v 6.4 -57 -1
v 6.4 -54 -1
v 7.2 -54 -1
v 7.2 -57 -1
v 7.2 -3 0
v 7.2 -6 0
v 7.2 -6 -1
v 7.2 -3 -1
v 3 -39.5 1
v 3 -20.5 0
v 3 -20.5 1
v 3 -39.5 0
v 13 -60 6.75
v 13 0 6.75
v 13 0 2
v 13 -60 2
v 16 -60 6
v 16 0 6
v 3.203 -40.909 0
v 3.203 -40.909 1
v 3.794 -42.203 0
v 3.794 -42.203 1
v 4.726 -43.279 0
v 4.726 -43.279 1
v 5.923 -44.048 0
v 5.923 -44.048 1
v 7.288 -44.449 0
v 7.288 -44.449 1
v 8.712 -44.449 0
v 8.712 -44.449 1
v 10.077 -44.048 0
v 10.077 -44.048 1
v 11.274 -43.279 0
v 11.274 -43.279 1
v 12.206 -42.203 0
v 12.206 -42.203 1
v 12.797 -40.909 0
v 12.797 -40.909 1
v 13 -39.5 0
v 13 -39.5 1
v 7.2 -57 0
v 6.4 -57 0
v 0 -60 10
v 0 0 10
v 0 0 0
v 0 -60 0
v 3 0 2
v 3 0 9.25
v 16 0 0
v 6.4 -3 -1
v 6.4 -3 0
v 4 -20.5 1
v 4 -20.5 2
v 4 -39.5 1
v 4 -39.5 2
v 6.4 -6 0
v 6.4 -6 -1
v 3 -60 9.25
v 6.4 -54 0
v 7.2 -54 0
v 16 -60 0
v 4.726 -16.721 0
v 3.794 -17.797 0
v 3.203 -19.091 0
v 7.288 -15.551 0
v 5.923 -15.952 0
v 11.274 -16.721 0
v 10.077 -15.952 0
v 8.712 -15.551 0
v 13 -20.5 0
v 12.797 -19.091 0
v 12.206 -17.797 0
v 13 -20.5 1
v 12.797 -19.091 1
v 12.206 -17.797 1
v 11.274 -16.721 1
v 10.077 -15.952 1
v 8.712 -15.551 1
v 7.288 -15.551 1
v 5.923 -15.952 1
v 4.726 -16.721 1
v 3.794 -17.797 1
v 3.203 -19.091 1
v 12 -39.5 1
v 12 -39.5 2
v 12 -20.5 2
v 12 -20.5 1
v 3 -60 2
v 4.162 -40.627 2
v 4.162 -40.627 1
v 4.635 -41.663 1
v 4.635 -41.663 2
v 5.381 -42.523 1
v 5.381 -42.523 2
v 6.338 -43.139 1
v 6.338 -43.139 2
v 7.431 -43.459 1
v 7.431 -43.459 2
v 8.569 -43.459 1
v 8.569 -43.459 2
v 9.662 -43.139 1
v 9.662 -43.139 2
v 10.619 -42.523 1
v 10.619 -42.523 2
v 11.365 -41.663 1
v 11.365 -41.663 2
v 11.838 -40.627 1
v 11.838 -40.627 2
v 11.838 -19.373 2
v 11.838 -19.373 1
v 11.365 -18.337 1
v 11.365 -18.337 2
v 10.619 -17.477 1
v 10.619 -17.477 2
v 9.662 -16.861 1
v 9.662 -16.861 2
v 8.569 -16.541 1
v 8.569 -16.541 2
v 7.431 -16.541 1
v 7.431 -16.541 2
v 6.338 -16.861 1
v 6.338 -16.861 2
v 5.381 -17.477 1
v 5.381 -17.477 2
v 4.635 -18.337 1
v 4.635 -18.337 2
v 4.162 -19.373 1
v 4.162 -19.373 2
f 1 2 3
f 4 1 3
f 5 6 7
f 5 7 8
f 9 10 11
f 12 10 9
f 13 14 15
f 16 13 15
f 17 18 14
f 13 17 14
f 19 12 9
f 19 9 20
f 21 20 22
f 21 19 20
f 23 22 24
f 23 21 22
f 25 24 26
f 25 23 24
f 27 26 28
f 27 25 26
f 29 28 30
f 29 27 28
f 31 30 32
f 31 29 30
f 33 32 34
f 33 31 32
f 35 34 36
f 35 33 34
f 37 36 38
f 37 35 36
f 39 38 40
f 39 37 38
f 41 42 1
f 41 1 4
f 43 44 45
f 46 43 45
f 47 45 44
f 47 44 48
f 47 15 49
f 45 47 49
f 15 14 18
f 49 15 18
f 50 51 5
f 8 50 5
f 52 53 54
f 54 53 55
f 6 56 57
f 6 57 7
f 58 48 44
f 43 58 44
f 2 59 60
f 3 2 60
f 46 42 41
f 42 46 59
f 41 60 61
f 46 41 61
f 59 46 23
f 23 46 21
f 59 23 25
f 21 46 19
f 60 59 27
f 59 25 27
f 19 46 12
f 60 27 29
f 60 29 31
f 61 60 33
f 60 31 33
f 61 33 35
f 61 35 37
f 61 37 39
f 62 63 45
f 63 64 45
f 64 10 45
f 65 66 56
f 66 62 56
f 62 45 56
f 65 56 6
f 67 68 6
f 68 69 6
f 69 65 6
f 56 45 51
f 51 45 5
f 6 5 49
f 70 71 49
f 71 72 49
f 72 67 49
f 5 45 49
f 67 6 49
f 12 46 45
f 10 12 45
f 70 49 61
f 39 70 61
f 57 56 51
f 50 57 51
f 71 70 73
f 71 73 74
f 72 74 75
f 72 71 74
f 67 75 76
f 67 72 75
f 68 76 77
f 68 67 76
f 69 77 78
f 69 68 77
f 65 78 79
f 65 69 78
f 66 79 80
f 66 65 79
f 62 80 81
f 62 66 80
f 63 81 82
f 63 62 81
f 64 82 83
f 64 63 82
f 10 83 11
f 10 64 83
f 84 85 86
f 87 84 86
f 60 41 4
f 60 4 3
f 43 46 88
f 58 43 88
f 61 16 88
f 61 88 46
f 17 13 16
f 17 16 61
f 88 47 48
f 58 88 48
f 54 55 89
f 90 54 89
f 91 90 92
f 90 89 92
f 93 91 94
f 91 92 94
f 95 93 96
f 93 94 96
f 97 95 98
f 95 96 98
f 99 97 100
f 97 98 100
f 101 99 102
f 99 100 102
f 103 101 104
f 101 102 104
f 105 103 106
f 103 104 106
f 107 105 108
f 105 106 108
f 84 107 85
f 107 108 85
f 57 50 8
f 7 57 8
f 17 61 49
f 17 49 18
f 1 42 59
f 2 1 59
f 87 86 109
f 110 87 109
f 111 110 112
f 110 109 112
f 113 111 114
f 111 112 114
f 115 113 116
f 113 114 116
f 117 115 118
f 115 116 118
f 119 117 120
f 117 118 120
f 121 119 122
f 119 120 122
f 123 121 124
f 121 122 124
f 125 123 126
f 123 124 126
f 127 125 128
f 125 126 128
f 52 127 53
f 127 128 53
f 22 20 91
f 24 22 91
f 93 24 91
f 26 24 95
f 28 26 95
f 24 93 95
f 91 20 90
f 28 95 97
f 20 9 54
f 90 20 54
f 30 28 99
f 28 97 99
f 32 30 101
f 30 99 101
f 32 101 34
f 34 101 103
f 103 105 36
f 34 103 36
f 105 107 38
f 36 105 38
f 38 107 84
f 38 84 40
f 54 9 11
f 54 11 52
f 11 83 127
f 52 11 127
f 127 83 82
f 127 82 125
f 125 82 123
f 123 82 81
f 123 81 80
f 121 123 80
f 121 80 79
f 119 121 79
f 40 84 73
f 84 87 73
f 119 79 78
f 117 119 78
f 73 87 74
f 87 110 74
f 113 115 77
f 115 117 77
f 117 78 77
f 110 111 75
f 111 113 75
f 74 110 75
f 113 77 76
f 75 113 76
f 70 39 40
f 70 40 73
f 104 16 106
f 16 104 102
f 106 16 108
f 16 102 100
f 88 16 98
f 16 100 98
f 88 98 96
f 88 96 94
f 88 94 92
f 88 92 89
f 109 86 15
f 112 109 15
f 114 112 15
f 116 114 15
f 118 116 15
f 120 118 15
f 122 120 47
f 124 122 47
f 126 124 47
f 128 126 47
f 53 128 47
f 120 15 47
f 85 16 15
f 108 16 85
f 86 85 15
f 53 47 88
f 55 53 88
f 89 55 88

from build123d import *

# Parameters (mm, degrees)
F1_DEPTH = 60
F3_DEPTH = 2.001
F5_DEPTH = 1
F6_W     = 0.8
F6_H     = 3
F7_DEPTH = 1


# Not quite as in the source:
# - a feature names something its author has since deleted; it is built from what else it names


with BuildPart() as f1:
    # F0 (on Front) → F1 (new body)
    with BuildSketch(Plane.XZ):
        Polygon((0, 10), (0, 0), (16, 0), (16, 6), (13, 6.75), (13, 2), (3, 2), (3, 9.25), align=None)
    extrude(amount=F1_DEPTH)

    # F2 (on face) → F3 (cut, through all)
    with BuildSketch(Plane.XY.offset(2)):
        with BuildLine():
            ThreePointArc((12, -20.5), (8, -16.5), (4, -20.5))
            Line((4, -20.5), (4, -39.5))
            ThreePointArc((4, -39.5), (8, -43.5), (12, -39.5))
            Line((12, -39.5), (12, -20.5))
        make_face()
    extrude(amount=-F3_DEPTH, mode=Mode.SUBTRACT)

    # F4 (on Top) → F5 (cut)
    with BuildSketch(Plane.XY):
        with BuildLine():
            ThreePointArc((13, -20.5), (8, -15.5), (3, -20.5))
            Line((3, -20.5), (3, -39.5))
            ThreePointArc((3, -39.5), (8, -44.5), (13, -39.5))
            Line((13, -39.5), (13, -20.5))
        make_face()
    extrude(amount=F5_DEPTH, mode=Mode.SUBTRACT)

    # F6 (on Top) → F7 (join)
    with BuildSketch(Plane.XY):
        with Locations((6.8, -4.5)):
            Rectangle(F6_W, F6_H)
        with Locations((6.8, -55.5)):
            Rectangle(F6_W, F6_H)
    extrude(amount=-F7_DEPTH)


solid = f1.part
